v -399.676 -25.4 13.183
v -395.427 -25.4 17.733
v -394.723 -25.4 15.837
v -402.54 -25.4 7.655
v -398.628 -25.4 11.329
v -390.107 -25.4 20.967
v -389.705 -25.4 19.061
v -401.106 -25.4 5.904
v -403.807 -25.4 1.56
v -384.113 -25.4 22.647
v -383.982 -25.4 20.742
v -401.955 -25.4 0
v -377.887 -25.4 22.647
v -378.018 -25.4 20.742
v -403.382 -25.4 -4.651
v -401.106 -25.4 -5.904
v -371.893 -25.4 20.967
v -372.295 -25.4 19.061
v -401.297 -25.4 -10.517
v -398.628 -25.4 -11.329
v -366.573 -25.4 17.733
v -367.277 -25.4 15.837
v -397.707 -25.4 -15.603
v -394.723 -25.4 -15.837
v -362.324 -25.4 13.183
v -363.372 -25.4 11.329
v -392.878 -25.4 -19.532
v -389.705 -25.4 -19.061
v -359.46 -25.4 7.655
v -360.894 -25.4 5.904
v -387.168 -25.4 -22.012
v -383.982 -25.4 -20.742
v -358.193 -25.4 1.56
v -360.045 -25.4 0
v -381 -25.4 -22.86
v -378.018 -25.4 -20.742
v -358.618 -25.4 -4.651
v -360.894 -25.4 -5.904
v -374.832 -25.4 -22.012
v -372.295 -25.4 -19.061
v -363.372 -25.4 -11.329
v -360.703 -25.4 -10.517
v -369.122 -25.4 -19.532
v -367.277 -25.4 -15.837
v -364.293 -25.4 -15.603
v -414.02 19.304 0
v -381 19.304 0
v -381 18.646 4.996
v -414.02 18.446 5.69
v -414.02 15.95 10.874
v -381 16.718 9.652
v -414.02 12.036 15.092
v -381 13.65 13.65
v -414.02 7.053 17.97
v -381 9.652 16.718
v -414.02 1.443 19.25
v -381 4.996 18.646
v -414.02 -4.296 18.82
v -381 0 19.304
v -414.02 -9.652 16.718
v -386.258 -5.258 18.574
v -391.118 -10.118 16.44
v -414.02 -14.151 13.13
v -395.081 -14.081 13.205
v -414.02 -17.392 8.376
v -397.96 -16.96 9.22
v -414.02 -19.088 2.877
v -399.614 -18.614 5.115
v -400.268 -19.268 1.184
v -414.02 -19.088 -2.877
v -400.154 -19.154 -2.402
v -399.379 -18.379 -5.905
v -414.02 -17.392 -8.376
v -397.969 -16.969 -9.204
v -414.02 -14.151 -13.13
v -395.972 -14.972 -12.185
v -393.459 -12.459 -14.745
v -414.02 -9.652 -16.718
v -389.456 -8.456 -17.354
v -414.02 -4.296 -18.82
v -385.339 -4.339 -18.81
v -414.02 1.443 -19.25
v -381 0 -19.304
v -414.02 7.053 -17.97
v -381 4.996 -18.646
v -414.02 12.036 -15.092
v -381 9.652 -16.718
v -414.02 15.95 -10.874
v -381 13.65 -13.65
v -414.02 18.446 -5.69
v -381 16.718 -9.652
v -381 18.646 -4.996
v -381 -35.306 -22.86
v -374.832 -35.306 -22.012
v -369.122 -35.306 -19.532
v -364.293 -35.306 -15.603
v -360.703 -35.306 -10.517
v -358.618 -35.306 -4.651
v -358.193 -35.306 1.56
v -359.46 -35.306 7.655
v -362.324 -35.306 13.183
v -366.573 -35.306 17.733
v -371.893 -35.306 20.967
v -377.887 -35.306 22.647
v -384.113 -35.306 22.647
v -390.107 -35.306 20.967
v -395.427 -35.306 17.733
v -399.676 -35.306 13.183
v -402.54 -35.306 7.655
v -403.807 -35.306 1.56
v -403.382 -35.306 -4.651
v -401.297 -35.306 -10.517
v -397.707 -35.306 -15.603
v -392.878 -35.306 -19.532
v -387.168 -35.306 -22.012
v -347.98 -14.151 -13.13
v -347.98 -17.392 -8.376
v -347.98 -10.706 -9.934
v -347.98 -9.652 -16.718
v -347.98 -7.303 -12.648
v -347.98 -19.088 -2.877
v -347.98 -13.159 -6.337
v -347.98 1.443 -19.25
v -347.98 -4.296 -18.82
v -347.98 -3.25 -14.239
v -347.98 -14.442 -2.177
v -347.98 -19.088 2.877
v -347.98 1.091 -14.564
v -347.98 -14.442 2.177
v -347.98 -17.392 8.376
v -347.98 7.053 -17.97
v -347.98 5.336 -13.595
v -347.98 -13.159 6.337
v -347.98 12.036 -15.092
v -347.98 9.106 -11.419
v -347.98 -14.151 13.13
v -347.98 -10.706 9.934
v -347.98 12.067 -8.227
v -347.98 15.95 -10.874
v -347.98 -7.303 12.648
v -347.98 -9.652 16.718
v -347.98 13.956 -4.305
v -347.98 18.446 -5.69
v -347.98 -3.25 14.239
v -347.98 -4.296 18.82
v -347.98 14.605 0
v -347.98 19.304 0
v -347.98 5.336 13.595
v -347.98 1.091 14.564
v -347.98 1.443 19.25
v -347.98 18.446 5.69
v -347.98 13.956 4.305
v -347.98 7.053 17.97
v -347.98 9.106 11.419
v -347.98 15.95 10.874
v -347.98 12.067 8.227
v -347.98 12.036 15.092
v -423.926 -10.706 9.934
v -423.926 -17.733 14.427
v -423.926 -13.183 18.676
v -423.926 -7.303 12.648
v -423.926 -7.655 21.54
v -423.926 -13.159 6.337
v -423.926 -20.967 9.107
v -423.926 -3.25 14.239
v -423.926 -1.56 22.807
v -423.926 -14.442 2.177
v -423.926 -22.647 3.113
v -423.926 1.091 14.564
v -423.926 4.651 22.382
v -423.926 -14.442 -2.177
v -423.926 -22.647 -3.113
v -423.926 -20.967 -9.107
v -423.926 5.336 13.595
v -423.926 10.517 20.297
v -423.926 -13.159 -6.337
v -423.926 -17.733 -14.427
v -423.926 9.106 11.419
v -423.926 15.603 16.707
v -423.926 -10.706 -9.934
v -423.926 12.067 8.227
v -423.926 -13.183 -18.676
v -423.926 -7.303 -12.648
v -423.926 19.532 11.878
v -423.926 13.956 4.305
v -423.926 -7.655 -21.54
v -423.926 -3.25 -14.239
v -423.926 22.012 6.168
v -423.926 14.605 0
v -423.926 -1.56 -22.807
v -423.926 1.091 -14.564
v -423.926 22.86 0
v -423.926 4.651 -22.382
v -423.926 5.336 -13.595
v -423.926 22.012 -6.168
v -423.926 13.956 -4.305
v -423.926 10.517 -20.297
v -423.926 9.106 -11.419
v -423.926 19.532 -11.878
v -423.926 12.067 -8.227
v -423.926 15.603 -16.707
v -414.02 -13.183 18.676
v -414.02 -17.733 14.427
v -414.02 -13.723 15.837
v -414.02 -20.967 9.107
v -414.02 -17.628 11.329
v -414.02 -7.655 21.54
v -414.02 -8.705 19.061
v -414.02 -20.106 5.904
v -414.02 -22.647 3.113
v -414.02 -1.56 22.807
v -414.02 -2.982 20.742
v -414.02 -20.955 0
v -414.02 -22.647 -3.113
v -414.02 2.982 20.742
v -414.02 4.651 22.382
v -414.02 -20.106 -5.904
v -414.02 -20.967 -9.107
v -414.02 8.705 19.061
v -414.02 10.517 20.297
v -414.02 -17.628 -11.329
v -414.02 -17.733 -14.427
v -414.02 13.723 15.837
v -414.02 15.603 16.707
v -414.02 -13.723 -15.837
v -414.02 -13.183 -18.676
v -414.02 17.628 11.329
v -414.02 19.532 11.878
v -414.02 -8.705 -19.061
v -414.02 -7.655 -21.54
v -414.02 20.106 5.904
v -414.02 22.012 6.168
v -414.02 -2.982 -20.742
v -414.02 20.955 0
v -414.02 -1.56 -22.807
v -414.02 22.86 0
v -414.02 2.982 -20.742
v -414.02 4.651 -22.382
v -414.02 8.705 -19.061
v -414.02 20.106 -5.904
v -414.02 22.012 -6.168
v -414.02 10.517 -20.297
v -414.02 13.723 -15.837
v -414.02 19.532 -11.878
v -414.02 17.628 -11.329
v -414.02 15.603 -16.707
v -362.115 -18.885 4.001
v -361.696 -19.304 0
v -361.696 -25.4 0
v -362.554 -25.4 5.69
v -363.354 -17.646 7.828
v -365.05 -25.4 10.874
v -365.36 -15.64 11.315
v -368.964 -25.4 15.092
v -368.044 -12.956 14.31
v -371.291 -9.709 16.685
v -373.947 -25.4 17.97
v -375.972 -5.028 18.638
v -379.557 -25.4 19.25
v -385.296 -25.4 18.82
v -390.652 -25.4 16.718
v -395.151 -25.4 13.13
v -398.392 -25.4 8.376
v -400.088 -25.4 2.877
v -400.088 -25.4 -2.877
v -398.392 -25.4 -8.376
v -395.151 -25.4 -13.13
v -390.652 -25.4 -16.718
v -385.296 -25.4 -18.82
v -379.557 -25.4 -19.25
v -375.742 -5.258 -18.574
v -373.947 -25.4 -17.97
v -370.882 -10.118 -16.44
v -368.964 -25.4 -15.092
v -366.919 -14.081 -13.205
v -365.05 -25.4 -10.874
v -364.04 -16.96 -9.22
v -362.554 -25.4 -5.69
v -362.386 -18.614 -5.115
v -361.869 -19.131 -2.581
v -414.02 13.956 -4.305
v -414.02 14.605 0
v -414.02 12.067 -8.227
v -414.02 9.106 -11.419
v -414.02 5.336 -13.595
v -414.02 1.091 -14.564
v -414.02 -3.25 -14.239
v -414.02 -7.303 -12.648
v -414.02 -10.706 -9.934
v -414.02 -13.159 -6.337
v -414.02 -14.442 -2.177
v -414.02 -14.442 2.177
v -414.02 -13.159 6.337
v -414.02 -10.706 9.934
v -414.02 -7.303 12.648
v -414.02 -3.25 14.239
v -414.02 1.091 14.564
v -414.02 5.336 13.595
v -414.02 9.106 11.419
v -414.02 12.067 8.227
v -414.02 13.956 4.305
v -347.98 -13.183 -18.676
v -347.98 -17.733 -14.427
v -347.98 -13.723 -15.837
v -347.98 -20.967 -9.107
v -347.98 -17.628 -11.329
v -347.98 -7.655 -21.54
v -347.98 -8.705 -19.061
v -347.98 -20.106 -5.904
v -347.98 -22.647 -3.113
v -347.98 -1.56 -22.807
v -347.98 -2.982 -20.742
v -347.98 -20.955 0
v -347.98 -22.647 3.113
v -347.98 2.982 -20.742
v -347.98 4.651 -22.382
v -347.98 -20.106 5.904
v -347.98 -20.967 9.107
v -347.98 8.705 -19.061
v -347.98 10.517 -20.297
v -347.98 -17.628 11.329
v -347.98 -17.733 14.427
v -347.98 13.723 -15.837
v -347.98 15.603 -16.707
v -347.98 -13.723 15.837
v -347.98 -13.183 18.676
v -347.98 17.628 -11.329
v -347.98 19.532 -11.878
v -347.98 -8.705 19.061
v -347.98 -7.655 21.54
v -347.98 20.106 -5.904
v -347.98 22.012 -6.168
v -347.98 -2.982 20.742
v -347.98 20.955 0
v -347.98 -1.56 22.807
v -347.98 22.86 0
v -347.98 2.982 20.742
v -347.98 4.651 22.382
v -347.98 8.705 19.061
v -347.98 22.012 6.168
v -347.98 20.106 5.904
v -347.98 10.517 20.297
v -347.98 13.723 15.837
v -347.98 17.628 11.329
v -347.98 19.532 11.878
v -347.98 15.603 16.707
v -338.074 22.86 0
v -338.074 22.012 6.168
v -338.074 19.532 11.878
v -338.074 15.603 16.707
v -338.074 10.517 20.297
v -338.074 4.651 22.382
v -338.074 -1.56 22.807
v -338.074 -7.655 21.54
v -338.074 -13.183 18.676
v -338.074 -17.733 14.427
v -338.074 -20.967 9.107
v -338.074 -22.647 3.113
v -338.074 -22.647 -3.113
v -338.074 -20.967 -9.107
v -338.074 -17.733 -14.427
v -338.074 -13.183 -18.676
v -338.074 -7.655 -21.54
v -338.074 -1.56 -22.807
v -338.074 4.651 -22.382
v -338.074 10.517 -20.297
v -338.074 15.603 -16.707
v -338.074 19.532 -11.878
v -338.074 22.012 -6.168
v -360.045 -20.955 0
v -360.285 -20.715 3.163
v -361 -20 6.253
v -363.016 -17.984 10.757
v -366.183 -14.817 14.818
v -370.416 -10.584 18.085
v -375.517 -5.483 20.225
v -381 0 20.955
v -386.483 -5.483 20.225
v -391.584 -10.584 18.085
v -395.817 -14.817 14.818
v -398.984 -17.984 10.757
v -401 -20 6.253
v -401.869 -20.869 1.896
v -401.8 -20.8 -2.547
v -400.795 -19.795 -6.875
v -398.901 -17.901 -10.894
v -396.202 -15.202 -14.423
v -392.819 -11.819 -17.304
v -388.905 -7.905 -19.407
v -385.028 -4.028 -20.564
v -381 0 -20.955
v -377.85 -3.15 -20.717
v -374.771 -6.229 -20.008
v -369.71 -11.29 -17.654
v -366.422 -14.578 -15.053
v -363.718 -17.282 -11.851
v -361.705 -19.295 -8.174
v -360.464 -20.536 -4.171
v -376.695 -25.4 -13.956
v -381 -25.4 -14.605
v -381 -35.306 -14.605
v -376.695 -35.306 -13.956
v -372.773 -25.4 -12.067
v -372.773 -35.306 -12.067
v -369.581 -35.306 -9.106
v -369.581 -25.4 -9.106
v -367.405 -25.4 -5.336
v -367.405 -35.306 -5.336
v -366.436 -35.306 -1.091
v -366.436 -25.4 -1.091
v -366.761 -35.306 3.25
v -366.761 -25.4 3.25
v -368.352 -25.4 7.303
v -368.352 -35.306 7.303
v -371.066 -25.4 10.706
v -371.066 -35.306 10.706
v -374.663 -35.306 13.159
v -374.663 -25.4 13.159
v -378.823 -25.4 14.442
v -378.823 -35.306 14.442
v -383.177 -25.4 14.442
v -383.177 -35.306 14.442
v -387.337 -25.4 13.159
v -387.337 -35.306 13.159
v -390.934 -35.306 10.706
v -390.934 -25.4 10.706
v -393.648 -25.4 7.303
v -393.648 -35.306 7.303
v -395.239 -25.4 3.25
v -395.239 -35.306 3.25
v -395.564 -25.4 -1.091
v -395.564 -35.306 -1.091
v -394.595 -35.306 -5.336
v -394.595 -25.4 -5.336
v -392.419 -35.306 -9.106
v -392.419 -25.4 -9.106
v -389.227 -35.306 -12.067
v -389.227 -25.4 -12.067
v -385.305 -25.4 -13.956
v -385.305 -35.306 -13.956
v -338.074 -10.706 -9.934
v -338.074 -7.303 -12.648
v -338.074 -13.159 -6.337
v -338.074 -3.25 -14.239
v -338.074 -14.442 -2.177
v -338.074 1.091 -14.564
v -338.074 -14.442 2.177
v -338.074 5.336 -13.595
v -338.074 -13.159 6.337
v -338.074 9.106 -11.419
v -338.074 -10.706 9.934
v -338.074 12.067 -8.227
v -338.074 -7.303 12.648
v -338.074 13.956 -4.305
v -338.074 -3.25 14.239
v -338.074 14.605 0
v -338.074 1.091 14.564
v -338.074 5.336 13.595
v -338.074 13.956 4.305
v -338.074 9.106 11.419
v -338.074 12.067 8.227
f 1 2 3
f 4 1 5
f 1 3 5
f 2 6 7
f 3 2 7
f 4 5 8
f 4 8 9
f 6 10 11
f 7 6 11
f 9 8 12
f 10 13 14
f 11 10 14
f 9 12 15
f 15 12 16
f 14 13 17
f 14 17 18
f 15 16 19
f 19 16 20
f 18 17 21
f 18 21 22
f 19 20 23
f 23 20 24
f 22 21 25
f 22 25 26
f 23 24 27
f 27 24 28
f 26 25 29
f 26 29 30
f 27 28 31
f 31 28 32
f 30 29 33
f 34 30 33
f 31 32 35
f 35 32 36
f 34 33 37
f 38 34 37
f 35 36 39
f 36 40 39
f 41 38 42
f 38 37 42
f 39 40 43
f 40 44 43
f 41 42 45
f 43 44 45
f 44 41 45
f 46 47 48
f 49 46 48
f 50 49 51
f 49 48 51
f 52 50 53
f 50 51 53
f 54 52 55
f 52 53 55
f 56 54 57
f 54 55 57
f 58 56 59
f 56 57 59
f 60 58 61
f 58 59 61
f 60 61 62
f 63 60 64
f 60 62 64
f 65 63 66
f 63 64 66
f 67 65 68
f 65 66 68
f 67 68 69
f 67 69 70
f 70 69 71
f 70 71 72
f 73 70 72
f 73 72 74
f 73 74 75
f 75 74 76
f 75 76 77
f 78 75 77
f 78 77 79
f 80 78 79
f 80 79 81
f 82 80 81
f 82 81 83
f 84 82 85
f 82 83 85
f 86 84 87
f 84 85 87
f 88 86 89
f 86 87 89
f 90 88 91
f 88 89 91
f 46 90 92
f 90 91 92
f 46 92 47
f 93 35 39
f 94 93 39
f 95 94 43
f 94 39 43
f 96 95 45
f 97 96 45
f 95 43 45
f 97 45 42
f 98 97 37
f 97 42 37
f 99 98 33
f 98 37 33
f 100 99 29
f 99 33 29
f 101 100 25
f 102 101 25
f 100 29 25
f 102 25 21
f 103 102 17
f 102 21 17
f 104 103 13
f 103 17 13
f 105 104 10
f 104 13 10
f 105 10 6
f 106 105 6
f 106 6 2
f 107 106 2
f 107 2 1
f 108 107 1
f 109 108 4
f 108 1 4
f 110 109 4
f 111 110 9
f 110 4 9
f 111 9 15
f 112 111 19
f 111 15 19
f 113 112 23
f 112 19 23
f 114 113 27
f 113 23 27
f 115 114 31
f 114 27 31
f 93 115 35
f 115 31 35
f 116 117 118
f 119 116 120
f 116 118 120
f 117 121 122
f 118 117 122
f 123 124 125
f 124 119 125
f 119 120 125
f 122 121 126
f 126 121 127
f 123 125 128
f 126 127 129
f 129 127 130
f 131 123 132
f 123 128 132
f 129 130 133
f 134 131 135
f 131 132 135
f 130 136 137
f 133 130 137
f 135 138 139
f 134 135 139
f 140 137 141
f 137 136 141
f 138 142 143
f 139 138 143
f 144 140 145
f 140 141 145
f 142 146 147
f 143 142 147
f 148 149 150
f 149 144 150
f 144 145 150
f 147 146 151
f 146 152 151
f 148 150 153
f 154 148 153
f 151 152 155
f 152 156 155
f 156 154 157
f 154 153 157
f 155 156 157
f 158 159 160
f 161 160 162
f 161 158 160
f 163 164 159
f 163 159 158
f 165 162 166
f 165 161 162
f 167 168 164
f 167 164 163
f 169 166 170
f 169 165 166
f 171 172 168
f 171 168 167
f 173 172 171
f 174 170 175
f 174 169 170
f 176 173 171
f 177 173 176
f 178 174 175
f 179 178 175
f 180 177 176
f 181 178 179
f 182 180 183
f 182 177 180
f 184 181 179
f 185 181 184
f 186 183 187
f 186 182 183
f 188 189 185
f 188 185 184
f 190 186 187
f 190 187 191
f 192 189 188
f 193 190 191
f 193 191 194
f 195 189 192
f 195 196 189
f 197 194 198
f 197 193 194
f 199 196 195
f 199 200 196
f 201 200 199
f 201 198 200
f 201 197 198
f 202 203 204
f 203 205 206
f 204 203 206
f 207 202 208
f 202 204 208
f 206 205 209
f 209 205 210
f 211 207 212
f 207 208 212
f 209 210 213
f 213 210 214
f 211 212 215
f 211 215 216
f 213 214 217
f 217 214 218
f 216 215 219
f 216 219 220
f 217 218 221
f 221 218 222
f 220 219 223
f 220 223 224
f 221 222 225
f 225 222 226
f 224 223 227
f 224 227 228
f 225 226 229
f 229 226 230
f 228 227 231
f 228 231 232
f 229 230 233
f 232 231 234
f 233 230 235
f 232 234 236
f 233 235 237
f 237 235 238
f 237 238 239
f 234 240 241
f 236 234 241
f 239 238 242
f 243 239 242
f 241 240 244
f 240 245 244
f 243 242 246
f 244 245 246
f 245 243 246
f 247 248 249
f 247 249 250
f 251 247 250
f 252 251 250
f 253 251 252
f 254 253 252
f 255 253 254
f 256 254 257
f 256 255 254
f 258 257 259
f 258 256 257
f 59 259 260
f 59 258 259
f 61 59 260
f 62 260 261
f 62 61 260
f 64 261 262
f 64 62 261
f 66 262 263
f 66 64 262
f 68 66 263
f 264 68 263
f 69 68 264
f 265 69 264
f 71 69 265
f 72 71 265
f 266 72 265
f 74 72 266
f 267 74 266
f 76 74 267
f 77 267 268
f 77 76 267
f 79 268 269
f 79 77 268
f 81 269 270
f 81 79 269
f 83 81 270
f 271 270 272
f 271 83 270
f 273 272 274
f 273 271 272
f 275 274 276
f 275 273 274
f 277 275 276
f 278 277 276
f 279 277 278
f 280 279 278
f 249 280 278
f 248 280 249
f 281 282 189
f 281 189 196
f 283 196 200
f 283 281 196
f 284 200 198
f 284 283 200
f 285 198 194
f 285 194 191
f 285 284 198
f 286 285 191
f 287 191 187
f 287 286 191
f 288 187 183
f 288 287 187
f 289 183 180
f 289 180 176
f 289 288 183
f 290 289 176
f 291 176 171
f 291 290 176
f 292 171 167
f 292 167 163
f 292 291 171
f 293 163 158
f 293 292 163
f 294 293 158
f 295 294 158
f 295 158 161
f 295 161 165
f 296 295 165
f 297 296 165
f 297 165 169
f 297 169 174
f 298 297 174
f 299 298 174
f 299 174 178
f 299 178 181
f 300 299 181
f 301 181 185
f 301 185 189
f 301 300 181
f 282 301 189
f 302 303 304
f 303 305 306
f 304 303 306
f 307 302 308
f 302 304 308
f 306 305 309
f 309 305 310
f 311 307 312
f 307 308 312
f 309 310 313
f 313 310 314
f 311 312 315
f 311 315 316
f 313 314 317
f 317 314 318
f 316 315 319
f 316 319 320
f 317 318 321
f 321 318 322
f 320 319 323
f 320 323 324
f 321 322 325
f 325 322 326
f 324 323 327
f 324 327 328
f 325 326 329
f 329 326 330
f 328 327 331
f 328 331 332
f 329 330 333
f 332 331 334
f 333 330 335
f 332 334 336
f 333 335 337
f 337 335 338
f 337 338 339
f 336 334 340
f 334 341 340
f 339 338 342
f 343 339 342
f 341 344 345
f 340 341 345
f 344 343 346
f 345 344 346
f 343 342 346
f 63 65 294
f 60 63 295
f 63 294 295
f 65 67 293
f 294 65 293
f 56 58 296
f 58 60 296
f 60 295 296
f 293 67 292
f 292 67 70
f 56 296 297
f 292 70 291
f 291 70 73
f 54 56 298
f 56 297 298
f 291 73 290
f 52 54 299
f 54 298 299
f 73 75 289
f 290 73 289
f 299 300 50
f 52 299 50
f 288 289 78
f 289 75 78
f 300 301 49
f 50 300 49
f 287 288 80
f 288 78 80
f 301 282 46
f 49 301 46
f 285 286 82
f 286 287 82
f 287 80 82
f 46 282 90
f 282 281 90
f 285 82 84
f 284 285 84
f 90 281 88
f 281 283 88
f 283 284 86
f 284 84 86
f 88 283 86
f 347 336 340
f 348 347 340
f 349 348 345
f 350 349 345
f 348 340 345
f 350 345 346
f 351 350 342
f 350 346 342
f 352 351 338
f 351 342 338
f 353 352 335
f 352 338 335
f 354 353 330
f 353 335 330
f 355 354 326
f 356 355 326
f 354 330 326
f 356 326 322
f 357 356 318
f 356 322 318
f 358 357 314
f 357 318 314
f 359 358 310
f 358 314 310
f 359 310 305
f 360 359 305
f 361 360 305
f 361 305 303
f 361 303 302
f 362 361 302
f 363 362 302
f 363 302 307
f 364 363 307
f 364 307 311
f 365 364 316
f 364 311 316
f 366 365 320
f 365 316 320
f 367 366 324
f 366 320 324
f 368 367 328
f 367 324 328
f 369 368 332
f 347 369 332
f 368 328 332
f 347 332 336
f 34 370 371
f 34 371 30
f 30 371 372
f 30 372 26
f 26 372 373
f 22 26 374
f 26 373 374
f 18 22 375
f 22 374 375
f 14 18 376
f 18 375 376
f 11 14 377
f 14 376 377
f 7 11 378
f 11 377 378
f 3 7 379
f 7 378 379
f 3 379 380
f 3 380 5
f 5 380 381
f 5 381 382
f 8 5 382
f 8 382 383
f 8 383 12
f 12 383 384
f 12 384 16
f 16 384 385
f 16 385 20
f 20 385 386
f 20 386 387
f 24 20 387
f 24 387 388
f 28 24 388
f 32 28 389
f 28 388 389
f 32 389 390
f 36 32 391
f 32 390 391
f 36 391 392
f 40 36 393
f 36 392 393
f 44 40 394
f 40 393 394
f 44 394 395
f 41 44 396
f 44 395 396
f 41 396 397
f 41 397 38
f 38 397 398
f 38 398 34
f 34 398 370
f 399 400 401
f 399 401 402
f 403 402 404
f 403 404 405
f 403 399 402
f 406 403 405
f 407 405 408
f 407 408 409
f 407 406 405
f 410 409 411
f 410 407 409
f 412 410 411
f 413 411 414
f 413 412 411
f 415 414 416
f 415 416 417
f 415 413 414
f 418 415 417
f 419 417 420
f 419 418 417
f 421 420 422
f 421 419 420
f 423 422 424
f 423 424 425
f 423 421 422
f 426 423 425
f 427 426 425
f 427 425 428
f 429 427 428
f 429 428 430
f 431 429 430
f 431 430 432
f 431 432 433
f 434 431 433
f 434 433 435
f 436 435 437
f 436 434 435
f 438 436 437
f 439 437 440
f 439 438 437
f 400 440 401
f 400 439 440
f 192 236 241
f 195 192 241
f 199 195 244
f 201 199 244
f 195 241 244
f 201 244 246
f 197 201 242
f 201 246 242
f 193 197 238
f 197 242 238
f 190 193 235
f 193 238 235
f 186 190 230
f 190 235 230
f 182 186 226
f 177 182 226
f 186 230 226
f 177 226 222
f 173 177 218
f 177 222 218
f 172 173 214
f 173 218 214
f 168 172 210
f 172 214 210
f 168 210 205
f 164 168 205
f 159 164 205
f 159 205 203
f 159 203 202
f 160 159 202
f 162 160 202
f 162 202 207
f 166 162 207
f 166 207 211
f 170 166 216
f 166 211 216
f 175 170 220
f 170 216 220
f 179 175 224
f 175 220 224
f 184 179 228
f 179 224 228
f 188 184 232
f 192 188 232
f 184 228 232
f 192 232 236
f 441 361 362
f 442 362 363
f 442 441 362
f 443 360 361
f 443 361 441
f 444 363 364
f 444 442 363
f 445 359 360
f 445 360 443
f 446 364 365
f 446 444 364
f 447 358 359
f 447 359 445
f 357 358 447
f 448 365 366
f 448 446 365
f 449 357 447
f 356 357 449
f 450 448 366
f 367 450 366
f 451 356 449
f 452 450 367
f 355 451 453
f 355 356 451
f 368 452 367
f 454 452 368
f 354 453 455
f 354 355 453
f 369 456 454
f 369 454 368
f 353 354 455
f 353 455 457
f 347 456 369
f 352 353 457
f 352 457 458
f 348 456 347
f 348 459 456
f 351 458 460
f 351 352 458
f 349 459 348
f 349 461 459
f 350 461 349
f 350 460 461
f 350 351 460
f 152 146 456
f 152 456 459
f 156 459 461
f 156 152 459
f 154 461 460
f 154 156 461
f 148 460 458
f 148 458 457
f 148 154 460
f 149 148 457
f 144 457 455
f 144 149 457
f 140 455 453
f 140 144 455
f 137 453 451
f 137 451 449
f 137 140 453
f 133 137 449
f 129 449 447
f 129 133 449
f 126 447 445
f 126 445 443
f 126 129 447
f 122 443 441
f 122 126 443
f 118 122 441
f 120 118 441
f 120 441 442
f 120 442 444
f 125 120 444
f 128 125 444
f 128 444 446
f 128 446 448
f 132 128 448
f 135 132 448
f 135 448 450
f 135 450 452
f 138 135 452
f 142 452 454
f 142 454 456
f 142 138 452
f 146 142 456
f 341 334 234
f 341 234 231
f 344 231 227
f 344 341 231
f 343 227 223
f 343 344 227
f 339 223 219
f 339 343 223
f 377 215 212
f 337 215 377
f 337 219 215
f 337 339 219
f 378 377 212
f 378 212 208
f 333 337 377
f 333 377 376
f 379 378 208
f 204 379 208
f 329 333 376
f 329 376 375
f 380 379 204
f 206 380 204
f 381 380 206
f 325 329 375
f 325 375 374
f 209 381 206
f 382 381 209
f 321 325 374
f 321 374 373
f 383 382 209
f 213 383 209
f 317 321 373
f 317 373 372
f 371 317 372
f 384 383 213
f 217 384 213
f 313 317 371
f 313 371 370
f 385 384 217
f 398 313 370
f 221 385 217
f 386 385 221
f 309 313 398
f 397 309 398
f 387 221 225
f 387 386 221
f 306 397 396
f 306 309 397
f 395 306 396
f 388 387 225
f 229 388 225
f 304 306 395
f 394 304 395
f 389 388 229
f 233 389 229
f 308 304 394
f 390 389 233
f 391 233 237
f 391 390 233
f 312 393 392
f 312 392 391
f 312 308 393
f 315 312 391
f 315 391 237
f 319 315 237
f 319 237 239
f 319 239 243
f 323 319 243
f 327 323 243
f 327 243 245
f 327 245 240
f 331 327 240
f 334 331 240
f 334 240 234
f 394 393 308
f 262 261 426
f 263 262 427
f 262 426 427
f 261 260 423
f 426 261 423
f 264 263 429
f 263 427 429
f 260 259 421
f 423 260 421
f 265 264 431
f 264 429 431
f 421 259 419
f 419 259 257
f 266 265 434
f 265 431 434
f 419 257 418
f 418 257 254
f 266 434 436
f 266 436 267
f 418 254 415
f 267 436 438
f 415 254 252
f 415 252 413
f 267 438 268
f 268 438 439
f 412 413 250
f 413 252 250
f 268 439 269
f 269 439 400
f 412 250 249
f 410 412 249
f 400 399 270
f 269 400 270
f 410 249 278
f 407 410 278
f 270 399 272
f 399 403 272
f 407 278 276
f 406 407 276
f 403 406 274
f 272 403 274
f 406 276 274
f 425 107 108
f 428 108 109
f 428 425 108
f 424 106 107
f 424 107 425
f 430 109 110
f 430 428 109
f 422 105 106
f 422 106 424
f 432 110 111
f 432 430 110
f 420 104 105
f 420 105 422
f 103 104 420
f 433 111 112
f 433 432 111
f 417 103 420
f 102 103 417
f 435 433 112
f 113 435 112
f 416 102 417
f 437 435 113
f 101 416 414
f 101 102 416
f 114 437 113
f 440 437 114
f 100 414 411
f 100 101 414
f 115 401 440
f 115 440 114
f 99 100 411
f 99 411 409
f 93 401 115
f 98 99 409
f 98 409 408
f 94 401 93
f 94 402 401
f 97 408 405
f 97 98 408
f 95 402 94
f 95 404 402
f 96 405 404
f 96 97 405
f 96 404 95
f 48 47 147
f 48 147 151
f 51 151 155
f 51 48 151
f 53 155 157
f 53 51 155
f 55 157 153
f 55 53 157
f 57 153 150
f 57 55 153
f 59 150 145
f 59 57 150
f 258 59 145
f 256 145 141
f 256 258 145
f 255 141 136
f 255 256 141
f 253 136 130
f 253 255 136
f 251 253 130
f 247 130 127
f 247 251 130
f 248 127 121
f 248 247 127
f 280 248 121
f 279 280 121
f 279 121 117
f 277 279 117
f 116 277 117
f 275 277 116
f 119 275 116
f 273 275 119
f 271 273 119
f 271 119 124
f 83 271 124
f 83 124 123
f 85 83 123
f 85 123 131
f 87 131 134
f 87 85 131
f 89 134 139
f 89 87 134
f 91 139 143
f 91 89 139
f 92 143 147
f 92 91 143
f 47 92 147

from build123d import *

# Parameters (mm, degrees)
SKETCH047_R          = 20.955
PAD005_DEPTH         = 33.02
SKETCH048_R          = 20.955
PAD006_DEPTH         = 25.4
SKETCH050_R          = 19.304
POCKET005_DEPTH      = 33.021
POCKET005_DEPTH_BACK = 33.021
SKETCH049_R          = 19.304
POCKET006_DEPTH      = 25.401
SKETCH051_R          = 22.86
SKETCH051_R_2        = 14.605
PAD007_DEPTH         = 9.906
SKETCH052_R          = 22.86
SKETCH052_R_2        = 14.605
PAD008_DEPTH         = 9.906
SKETCH053_R          = 22.86
SKETCH053_R_2        = 14.605
PAD009_DEPTH         = 9.906


with BuildPart() as part:
    # Sketch047 → Pad005 (new body, symmetric)
    with BuildSketch(Plane.YZ):
        Circle(SKETCH047_R)
    extrude(amount=PAD005_DEPTH, both=True)

    # Sketch048 → Pad006 (join)
    with BuildSketch(Plane.XZ):
        Circle(SKETCH048_R)
    extrude(amount=PAD006_DEPTH)

    # Sketch050 → Pocket005 (cut, two sides)
    with BuildSketch(Plane.YZ) as pocket005_sk:
        Circle(SKETCH050_R)
    extrude(amount=-POCKET005_DEPTH, mode=Mode.SUBTRACT)
    extrude(pocket005_sk.sketch, amount=POCKET005_DEPTH_BACK, mode=Mode.SUBTRACT)

    # Sketch049 → Pocket006 (cut, through all)
    with BuildSketch(Plane.XZ):
        Circle(SKETCH049_R)
    extrude(amount=POCKET006_DEPTH, mode=Mode.SUBTRACT)

    # Sketch051 (on Face6 of Pocket006) → Pad007 (join)
    with BuildSketch(Plane(origin=(0, -25.4, 0), x_dir=(0, 0, -1), z_dir=(0, -1, 0))):
        Circle(SKETCH051_R)
        Circle(SKETCH051_R_2, mode=Mode.SUBTRACT)
    extrude(amount=PAD007_DEPTH)

    # Sketch052 (on Face8 of Pad007) → Pad008 (join)
    with BuildSketch(Plane(origin=(-33.02, 0, 0), x_dir=(0, 1, 0), z_dir=(-1, 0, 0))):
        Circle(SKETCH052_R)
        Circle(SKETCH052_R_2, mode=Mode.SUBTRACT)
    extrude(amount=PAD008_DEPTH)

    # Sketch053 (on Face6 of Pad008) → Pad009 (join)
    with BuildSketch(Plane.YZ.offset(33.02)):
        Circle(SKETCH053_R)
        Circle(SKETCH053_R_2, mode=Mode.SUBTRACT)
    extrude(amount=PAD009_DEPTH)


with BuildPart() as part_1:
    # Body013 placement: moved
    add(part.part.moved(Location((-381, 0, 0))))


solid = part_1.part
